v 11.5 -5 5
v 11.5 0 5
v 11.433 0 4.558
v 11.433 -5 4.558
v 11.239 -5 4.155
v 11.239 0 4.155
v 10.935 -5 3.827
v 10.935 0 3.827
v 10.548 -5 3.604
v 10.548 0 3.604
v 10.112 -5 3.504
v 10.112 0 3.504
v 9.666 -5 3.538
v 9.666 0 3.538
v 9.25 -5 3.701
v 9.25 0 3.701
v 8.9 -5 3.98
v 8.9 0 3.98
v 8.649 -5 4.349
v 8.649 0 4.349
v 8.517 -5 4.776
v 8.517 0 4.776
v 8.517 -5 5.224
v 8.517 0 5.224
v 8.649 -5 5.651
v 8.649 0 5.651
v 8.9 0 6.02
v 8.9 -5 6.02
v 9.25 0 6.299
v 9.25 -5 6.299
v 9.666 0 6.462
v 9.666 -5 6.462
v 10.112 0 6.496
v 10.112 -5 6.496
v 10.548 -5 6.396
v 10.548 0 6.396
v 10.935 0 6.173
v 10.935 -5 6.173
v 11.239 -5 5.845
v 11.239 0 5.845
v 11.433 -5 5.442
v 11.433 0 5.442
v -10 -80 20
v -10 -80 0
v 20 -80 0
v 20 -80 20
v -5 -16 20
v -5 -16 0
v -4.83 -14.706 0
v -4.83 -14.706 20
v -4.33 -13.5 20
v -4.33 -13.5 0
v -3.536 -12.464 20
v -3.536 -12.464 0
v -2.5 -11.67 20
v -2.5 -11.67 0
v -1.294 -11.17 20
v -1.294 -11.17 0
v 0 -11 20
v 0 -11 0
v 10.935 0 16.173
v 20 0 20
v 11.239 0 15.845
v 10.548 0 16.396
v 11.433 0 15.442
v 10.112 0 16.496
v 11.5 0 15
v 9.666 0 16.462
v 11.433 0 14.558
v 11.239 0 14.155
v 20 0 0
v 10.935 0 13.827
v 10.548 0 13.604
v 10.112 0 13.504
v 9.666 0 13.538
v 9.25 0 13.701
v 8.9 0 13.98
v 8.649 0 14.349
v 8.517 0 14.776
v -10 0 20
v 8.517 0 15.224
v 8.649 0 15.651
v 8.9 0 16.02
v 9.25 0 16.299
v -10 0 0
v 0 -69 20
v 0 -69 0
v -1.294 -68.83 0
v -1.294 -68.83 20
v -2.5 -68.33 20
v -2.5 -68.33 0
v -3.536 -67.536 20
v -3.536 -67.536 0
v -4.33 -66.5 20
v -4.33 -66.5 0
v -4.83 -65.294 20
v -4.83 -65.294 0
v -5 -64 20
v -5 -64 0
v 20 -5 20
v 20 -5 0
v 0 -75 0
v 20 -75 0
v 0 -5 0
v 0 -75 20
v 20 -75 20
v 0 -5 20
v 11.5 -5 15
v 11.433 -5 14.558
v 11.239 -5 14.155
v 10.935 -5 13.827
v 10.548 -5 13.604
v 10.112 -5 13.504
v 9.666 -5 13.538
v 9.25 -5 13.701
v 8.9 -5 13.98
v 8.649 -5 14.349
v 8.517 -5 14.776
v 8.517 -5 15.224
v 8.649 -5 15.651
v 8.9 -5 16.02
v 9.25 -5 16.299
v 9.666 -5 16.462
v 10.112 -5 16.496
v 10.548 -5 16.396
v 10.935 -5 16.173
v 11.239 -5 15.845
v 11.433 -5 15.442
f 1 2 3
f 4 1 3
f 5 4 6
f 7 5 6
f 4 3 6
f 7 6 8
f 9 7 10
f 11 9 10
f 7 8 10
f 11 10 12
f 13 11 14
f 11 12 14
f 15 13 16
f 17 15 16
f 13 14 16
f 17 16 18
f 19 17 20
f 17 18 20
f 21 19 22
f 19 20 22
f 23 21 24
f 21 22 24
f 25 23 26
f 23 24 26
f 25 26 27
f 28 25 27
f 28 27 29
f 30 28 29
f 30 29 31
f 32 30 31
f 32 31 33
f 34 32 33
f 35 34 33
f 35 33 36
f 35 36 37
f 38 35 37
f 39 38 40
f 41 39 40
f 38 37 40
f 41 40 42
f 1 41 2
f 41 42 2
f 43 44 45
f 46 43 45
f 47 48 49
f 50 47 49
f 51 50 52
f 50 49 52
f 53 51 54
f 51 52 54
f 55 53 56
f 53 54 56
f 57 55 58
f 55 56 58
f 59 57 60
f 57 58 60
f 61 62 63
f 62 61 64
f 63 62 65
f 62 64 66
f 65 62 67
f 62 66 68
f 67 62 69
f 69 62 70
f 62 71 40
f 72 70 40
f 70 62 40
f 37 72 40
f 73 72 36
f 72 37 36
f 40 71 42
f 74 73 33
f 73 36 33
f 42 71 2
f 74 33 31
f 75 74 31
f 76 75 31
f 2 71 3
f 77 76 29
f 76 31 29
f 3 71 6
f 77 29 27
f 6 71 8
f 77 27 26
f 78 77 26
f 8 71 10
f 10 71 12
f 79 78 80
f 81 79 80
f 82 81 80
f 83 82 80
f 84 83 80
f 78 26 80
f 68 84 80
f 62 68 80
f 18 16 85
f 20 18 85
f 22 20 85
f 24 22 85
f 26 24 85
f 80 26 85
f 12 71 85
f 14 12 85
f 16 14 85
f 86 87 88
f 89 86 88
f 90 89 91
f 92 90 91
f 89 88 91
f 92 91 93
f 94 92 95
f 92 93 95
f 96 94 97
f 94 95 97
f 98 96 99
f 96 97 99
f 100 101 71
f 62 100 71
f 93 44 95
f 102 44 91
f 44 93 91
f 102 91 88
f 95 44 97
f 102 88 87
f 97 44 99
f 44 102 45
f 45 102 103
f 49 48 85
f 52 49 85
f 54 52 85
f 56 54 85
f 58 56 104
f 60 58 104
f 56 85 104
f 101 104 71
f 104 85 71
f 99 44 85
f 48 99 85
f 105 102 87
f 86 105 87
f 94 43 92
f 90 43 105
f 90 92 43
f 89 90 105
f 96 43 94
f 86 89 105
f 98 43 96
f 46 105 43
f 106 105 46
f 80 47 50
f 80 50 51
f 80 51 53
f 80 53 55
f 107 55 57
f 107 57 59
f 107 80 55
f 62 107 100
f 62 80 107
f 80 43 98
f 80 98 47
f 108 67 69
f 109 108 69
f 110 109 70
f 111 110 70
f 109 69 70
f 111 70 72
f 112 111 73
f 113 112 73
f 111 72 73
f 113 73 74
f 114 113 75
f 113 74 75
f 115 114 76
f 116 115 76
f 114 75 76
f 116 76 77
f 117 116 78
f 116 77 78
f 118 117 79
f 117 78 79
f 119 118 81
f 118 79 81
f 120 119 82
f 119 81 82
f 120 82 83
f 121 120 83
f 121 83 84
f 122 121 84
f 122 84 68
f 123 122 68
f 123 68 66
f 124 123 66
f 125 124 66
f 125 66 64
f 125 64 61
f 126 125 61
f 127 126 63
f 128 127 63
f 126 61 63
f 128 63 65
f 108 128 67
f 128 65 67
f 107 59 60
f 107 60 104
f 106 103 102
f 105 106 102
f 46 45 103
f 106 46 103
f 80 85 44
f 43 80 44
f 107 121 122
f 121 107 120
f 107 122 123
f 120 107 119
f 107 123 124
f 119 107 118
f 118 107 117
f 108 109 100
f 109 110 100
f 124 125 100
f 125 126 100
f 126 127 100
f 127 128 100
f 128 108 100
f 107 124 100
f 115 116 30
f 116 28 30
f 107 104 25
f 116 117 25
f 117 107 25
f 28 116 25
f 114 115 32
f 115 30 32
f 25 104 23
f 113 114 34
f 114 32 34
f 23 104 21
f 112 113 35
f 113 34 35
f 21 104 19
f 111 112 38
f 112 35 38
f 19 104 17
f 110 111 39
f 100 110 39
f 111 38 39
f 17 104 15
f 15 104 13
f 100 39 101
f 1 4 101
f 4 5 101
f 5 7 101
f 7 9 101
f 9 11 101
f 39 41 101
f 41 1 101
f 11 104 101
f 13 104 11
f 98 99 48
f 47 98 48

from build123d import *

# Parameters (mm, degrees)
BOSS_EXTRUDE1_DEPTH = 20
BOSS_EXTRUDE2_DEPTH = 20
SKETCH4_R           = 1.5
CUT_EXTRUDE1_DEPTH  = 5


with BuildPart() as part:
    # Sketch1 → Boss-Extrude1 (new body)
    with BuildSketch(Plane.XY):
        Polygon((20, 0), (-10, 0), (-10, -80), (20, -80), (20, -75), (-5, -75), (-5, -5), (20, -5), align=None)
    extrude(amount=BOSS_EXTRUDE1_DEPTH)

    # Sketch3 → Boss-Extrude2 (add)
    with BuildSketch(Plane.XY):
        with BuildLine():
            Line((0, -5), (-5, -5))
            Line((-5, -5), (-5, -16))
            ThreePointArc((-5, -16), (-3.535533906, -12.464466094), (0, -11))
            Line((0, -11), (0, -5))
        make_face()
        with BuildLine():
            Line((-5, -75), (0, -75))
            Line((0, -75), (0, -69))
            ThreePointArc((0, -69), (-3.535533906, -67.535533906), (-5, -64))
            Line((-5, -64), (-5, -75))
        make_face()
    extrude(amount=BOSS_EXTRUDE2_DEPTH)

    # Sketch4 → Cut-Extrude1 (cut)
    with BuildSketch(Plane(origin=(0, 0, 0), x_dir=(1, 0, 0), z_dir=(0, 1, 0))):
        with Locations((10, -5)):
            Circle(SKETCH4_R)
        with Locations((10, -15)):
            Circle(SKETCH4_R)
    extrude(amount=-CUT_EXTRUDE1_DEPTH, mode=Mode.SUBTRACT)


solid = part.part
